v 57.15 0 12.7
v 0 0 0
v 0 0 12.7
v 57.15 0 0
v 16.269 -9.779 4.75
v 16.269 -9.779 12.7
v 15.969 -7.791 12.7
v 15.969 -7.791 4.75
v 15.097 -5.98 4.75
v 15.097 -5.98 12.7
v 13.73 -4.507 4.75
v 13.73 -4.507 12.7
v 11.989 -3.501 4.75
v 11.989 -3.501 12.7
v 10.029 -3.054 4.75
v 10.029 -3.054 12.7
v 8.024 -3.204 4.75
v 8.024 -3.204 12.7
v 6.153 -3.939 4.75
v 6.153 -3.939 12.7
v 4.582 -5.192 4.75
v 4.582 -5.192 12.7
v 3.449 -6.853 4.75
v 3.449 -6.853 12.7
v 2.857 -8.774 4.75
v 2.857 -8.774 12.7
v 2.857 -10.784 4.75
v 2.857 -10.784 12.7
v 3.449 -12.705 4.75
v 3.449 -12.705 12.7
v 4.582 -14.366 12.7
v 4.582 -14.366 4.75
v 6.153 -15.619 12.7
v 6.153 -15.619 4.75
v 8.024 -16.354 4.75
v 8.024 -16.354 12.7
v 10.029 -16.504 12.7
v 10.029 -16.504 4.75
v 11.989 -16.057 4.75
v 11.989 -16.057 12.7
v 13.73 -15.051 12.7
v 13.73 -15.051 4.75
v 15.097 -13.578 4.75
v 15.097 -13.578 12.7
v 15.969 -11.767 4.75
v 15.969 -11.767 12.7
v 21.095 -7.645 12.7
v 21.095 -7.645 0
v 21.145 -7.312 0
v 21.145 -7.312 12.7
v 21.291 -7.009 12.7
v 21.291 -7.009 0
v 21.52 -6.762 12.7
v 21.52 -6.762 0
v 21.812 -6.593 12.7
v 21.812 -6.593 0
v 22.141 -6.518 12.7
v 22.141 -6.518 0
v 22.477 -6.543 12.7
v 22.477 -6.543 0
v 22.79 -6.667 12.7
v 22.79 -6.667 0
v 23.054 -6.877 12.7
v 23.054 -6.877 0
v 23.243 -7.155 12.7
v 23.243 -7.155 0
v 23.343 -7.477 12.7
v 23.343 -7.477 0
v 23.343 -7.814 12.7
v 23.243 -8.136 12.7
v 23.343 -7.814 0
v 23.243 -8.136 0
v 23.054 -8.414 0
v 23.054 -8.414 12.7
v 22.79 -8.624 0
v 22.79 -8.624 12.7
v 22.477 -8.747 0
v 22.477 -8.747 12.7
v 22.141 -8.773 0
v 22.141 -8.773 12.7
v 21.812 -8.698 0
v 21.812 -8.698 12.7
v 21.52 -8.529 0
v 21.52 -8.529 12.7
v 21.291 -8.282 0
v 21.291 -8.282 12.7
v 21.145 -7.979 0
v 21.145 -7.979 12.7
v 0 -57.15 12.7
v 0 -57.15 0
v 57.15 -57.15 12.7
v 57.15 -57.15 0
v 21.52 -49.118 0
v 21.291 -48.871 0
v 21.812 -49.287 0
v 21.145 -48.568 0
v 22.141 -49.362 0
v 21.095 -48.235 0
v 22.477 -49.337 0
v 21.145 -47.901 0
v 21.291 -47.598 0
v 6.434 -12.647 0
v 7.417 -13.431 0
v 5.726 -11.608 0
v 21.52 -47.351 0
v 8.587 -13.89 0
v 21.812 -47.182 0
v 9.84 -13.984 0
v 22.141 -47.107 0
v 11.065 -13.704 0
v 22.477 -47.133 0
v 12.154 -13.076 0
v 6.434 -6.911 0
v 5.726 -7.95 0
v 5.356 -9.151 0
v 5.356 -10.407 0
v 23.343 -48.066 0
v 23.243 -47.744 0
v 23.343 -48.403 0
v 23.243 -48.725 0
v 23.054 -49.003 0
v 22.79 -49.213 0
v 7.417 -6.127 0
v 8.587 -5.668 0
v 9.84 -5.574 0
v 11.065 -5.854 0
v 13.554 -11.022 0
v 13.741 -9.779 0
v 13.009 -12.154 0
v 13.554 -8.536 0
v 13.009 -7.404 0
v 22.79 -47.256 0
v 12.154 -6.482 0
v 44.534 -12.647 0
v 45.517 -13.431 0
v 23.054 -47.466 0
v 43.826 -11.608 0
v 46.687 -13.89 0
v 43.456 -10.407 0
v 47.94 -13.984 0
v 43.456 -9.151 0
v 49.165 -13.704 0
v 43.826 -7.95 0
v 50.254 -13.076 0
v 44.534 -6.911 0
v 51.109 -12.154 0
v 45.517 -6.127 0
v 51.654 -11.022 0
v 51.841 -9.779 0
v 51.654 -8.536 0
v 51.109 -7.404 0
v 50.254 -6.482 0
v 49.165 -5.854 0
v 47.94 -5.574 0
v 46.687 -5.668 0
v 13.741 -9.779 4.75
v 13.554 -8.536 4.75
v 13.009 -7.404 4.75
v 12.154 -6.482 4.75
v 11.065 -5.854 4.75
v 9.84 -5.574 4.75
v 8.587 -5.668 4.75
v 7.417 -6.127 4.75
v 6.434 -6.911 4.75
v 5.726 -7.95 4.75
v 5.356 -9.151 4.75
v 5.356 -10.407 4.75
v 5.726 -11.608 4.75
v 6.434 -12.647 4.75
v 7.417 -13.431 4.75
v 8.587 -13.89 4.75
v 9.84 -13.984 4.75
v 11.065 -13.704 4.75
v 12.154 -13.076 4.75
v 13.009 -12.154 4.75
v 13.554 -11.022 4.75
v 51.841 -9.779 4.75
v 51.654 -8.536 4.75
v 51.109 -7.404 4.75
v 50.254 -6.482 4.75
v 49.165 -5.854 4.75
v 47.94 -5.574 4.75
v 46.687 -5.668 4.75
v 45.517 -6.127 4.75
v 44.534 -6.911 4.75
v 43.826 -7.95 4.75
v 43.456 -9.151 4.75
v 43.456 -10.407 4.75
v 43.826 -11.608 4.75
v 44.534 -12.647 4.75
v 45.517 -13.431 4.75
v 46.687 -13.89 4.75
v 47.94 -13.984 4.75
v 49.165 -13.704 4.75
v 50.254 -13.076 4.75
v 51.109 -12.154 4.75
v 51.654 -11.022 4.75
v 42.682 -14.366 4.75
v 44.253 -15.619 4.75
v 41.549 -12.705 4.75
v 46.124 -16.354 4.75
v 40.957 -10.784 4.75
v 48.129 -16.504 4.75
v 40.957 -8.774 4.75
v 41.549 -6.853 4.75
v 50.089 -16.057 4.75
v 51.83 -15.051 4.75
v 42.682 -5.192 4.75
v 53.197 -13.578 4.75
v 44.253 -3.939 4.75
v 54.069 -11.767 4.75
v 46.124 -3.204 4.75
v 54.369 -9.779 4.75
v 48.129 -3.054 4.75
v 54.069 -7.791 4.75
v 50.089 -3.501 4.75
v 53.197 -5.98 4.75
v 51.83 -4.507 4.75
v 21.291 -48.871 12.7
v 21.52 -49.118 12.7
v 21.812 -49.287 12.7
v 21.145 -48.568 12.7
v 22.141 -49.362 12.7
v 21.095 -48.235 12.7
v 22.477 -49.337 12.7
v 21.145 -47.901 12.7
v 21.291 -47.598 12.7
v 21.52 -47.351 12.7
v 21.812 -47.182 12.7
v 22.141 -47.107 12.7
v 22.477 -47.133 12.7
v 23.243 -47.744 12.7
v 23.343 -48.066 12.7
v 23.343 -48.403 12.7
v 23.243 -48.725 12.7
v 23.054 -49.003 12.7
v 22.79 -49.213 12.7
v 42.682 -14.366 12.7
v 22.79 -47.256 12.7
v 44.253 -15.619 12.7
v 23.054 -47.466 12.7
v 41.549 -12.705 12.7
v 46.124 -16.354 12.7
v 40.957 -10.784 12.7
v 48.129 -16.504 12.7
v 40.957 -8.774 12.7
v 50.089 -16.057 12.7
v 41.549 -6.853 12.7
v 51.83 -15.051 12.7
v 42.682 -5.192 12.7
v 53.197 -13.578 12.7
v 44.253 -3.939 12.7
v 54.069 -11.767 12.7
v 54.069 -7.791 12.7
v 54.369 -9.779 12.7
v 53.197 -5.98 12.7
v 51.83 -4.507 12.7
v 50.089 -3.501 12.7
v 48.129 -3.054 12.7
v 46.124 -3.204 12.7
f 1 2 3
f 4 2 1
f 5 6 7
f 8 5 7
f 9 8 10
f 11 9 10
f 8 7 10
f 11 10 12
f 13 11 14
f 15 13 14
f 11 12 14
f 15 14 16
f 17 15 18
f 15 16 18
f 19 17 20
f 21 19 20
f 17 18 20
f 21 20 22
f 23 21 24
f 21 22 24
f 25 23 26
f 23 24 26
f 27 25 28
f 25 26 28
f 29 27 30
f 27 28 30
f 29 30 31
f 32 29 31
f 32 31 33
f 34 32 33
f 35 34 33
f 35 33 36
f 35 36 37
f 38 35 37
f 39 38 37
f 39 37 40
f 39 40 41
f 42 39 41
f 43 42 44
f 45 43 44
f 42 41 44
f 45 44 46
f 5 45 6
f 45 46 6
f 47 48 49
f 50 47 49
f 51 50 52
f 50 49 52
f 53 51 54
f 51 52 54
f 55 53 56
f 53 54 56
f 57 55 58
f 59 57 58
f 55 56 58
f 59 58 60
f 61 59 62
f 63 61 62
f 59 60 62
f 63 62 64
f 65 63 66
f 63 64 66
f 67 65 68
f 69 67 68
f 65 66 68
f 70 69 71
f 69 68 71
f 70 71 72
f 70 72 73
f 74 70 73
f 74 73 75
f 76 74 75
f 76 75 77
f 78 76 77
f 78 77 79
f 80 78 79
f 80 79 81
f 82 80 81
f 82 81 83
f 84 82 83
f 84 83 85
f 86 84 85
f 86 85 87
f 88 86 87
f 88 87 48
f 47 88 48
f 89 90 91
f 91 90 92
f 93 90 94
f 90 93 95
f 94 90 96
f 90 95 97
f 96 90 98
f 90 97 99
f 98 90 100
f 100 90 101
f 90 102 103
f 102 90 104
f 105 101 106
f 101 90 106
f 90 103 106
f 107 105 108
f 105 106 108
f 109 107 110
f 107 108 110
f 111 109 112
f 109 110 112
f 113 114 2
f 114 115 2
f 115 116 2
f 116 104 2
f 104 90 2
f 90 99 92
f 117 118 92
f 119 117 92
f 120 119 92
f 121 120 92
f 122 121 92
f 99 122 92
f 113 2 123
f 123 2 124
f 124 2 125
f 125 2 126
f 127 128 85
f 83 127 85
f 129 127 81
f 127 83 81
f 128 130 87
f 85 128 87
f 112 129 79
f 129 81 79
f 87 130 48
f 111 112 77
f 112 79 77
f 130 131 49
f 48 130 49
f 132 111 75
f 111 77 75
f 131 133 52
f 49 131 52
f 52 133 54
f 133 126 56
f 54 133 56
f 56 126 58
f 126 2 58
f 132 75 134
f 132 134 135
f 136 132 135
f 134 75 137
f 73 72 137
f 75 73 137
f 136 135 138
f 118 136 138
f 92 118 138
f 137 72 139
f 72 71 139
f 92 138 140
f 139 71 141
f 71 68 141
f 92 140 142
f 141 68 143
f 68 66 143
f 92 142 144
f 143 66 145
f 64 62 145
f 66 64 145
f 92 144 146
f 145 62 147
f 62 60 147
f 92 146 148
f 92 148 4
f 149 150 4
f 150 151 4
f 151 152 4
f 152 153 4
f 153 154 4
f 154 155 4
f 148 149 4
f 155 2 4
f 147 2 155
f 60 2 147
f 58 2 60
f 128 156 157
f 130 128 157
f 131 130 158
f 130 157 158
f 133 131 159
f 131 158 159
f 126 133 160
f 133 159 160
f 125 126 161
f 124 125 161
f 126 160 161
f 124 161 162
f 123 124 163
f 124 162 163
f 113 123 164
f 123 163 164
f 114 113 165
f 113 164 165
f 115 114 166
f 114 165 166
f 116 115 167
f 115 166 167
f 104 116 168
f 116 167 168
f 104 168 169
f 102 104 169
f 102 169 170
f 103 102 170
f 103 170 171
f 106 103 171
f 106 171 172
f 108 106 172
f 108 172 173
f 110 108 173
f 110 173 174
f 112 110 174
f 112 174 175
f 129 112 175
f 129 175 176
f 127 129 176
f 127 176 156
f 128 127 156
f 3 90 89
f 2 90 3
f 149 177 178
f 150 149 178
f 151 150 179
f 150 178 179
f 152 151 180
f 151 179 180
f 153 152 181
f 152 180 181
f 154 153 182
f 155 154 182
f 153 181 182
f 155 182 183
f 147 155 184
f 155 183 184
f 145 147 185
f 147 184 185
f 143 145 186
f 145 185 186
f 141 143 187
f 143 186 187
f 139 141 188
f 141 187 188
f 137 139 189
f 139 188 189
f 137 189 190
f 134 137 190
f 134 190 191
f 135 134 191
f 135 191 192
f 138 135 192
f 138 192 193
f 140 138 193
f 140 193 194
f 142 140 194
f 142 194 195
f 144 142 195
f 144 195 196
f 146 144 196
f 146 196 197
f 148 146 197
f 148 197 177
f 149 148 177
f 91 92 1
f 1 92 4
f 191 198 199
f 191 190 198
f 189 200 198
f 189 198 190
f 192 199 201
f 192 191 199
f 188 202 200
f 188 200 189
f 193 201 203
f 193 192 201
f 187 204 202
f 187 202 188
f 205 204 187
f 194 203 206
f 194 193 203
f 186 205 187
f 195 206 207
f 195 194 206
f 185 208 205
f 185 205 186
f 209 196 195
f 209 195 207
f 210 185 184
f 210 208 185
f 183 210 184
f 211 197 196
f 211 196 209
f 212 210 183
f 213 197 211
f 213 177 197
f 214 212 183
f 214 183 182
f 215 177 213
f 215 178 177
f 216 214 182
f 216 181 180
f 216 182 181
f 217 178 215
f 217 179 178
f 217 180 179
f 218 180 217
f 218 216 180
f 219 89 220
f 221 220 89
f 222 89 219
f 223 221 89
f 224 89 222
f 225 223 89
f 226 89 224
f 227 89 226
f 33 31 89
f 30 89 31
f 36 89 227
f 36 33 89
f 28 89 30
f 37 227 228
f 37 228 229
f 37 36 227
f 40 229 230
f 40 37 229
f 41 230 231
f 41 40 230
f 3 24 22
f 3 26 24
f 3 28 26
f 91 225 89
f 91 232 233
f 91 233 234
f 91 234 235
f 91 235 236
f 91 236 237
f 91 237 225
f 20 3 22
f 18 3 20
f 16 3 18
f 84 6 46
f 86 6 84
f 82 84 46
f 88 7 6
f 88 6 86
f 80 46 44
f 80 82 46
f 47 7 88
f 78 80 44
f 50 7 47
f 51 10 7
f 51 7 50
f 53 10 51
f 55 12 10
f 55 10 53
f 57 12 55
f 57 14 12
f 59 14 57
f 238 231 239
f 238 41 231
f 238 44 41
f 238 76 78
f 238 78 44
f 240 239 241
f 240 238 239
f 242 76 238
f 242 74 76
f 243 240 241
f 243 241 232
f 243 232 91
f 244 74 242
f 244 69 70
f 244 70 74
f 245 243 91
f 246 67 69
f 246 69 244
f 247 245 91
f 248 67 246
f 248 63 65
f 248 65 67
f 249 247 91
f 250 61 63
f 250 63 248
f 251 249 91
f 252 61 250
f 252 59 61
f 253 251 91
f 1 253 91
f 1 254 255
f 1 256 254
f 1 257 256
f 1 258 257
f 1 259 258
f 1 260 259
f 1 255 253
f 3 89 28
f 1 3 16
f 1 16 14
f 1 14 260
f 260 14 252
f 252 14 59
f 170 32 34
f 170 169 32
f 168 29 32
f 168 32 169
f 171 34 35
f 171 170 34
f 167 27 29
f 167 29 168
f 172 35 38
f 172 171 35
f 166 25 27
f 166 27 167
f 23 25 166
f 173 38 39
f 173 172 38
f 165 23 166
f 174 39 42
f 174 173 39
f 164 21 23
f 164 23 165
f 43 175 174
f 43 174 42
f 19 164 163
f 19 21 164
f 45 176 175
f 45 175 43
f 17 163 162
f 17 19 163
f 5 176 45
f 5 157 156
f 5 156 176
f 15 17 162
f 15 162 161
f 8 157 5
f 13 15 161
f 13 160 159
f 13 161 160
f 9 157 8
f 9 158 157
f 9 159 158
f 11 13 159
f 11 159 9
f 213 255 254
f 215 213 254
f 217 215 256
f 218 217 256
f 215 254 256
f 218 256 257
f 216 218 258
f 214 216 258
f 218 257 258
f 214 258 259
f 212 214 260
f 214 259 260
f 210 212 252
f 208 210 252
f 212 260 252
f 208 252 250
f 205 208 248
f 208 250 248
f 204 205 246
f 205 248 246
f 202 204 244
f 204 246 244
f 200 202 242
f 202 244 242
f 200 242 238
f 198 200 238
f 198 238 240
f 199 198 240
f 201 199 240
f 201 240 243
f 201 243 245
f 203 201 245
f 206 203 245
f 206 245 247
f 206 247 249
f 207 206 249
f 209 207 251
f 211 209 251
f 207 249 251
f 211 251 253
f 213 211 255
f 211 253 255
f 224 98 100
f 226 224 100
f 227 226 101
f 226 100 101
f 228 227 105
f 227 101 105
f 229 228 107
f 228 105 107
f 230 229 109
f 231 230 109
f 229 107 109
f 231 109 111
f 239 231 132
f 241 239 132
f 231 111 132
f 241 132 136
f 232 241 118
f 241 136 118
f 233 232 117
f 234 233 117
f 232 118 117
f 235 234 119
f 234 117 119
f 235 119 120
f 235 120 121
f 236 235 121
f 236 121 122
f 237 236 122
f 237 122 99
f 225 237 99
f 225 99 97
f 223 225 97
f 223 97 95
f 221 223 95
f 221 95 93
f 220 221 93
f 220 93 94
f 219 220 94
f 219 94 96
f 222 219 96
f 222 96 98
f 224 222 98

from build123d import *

# Parameters (mm, degrees)
F0_W     = 57.15
F0_H     = 57.15
F1_DEPTH = 12.7
F2_R     = 4.2164
F3_DEPTH = 12.701
F4_R     = 6.7437
F5_DEPTH = 7.9502
F7_D     = 2.2606


with BuildPart() as f1:
    # F0 (on Top) → F1 (new body)
    with BuildSketch(Plane.XY):
        with Locations((28.575, -28.575)):
            Rectangle(F0_W, F0_H)
    extrude(amount=F1_DEPTH)

    # F2 (on face) → F3 (cut, through all)
    with BuildSketch(Plane.XY.offset(12.7)):
        with Locations((9.525, -9.779)):
            Circle(F2_R)
        with Locations((47.625, -9.779)):
            Circle(F2_R)
    extrude(amount=-F3_DEPTH, mode=Mode.SUBTRACT)

    # F4 (on face) → F5 (cut)
    with BuildSketch(Plane.XY.offset(12.7)):
        with Locations((9.525, -9.779)):
            Circle(F4_R)
        with Locations((47.625, -9.779)):
            Circle(F4_R)
    extrude(amount=-F5_DEPTH, mode=Mode.SUBTRACT)

    # F7 (through all)
    with Locations(Plane.XY.offset(12.7)):
        with Locations((22.225, -7.6454), (22.225, -48.2346)):
            Hole(F7_D / 2)


solid = f1.part
